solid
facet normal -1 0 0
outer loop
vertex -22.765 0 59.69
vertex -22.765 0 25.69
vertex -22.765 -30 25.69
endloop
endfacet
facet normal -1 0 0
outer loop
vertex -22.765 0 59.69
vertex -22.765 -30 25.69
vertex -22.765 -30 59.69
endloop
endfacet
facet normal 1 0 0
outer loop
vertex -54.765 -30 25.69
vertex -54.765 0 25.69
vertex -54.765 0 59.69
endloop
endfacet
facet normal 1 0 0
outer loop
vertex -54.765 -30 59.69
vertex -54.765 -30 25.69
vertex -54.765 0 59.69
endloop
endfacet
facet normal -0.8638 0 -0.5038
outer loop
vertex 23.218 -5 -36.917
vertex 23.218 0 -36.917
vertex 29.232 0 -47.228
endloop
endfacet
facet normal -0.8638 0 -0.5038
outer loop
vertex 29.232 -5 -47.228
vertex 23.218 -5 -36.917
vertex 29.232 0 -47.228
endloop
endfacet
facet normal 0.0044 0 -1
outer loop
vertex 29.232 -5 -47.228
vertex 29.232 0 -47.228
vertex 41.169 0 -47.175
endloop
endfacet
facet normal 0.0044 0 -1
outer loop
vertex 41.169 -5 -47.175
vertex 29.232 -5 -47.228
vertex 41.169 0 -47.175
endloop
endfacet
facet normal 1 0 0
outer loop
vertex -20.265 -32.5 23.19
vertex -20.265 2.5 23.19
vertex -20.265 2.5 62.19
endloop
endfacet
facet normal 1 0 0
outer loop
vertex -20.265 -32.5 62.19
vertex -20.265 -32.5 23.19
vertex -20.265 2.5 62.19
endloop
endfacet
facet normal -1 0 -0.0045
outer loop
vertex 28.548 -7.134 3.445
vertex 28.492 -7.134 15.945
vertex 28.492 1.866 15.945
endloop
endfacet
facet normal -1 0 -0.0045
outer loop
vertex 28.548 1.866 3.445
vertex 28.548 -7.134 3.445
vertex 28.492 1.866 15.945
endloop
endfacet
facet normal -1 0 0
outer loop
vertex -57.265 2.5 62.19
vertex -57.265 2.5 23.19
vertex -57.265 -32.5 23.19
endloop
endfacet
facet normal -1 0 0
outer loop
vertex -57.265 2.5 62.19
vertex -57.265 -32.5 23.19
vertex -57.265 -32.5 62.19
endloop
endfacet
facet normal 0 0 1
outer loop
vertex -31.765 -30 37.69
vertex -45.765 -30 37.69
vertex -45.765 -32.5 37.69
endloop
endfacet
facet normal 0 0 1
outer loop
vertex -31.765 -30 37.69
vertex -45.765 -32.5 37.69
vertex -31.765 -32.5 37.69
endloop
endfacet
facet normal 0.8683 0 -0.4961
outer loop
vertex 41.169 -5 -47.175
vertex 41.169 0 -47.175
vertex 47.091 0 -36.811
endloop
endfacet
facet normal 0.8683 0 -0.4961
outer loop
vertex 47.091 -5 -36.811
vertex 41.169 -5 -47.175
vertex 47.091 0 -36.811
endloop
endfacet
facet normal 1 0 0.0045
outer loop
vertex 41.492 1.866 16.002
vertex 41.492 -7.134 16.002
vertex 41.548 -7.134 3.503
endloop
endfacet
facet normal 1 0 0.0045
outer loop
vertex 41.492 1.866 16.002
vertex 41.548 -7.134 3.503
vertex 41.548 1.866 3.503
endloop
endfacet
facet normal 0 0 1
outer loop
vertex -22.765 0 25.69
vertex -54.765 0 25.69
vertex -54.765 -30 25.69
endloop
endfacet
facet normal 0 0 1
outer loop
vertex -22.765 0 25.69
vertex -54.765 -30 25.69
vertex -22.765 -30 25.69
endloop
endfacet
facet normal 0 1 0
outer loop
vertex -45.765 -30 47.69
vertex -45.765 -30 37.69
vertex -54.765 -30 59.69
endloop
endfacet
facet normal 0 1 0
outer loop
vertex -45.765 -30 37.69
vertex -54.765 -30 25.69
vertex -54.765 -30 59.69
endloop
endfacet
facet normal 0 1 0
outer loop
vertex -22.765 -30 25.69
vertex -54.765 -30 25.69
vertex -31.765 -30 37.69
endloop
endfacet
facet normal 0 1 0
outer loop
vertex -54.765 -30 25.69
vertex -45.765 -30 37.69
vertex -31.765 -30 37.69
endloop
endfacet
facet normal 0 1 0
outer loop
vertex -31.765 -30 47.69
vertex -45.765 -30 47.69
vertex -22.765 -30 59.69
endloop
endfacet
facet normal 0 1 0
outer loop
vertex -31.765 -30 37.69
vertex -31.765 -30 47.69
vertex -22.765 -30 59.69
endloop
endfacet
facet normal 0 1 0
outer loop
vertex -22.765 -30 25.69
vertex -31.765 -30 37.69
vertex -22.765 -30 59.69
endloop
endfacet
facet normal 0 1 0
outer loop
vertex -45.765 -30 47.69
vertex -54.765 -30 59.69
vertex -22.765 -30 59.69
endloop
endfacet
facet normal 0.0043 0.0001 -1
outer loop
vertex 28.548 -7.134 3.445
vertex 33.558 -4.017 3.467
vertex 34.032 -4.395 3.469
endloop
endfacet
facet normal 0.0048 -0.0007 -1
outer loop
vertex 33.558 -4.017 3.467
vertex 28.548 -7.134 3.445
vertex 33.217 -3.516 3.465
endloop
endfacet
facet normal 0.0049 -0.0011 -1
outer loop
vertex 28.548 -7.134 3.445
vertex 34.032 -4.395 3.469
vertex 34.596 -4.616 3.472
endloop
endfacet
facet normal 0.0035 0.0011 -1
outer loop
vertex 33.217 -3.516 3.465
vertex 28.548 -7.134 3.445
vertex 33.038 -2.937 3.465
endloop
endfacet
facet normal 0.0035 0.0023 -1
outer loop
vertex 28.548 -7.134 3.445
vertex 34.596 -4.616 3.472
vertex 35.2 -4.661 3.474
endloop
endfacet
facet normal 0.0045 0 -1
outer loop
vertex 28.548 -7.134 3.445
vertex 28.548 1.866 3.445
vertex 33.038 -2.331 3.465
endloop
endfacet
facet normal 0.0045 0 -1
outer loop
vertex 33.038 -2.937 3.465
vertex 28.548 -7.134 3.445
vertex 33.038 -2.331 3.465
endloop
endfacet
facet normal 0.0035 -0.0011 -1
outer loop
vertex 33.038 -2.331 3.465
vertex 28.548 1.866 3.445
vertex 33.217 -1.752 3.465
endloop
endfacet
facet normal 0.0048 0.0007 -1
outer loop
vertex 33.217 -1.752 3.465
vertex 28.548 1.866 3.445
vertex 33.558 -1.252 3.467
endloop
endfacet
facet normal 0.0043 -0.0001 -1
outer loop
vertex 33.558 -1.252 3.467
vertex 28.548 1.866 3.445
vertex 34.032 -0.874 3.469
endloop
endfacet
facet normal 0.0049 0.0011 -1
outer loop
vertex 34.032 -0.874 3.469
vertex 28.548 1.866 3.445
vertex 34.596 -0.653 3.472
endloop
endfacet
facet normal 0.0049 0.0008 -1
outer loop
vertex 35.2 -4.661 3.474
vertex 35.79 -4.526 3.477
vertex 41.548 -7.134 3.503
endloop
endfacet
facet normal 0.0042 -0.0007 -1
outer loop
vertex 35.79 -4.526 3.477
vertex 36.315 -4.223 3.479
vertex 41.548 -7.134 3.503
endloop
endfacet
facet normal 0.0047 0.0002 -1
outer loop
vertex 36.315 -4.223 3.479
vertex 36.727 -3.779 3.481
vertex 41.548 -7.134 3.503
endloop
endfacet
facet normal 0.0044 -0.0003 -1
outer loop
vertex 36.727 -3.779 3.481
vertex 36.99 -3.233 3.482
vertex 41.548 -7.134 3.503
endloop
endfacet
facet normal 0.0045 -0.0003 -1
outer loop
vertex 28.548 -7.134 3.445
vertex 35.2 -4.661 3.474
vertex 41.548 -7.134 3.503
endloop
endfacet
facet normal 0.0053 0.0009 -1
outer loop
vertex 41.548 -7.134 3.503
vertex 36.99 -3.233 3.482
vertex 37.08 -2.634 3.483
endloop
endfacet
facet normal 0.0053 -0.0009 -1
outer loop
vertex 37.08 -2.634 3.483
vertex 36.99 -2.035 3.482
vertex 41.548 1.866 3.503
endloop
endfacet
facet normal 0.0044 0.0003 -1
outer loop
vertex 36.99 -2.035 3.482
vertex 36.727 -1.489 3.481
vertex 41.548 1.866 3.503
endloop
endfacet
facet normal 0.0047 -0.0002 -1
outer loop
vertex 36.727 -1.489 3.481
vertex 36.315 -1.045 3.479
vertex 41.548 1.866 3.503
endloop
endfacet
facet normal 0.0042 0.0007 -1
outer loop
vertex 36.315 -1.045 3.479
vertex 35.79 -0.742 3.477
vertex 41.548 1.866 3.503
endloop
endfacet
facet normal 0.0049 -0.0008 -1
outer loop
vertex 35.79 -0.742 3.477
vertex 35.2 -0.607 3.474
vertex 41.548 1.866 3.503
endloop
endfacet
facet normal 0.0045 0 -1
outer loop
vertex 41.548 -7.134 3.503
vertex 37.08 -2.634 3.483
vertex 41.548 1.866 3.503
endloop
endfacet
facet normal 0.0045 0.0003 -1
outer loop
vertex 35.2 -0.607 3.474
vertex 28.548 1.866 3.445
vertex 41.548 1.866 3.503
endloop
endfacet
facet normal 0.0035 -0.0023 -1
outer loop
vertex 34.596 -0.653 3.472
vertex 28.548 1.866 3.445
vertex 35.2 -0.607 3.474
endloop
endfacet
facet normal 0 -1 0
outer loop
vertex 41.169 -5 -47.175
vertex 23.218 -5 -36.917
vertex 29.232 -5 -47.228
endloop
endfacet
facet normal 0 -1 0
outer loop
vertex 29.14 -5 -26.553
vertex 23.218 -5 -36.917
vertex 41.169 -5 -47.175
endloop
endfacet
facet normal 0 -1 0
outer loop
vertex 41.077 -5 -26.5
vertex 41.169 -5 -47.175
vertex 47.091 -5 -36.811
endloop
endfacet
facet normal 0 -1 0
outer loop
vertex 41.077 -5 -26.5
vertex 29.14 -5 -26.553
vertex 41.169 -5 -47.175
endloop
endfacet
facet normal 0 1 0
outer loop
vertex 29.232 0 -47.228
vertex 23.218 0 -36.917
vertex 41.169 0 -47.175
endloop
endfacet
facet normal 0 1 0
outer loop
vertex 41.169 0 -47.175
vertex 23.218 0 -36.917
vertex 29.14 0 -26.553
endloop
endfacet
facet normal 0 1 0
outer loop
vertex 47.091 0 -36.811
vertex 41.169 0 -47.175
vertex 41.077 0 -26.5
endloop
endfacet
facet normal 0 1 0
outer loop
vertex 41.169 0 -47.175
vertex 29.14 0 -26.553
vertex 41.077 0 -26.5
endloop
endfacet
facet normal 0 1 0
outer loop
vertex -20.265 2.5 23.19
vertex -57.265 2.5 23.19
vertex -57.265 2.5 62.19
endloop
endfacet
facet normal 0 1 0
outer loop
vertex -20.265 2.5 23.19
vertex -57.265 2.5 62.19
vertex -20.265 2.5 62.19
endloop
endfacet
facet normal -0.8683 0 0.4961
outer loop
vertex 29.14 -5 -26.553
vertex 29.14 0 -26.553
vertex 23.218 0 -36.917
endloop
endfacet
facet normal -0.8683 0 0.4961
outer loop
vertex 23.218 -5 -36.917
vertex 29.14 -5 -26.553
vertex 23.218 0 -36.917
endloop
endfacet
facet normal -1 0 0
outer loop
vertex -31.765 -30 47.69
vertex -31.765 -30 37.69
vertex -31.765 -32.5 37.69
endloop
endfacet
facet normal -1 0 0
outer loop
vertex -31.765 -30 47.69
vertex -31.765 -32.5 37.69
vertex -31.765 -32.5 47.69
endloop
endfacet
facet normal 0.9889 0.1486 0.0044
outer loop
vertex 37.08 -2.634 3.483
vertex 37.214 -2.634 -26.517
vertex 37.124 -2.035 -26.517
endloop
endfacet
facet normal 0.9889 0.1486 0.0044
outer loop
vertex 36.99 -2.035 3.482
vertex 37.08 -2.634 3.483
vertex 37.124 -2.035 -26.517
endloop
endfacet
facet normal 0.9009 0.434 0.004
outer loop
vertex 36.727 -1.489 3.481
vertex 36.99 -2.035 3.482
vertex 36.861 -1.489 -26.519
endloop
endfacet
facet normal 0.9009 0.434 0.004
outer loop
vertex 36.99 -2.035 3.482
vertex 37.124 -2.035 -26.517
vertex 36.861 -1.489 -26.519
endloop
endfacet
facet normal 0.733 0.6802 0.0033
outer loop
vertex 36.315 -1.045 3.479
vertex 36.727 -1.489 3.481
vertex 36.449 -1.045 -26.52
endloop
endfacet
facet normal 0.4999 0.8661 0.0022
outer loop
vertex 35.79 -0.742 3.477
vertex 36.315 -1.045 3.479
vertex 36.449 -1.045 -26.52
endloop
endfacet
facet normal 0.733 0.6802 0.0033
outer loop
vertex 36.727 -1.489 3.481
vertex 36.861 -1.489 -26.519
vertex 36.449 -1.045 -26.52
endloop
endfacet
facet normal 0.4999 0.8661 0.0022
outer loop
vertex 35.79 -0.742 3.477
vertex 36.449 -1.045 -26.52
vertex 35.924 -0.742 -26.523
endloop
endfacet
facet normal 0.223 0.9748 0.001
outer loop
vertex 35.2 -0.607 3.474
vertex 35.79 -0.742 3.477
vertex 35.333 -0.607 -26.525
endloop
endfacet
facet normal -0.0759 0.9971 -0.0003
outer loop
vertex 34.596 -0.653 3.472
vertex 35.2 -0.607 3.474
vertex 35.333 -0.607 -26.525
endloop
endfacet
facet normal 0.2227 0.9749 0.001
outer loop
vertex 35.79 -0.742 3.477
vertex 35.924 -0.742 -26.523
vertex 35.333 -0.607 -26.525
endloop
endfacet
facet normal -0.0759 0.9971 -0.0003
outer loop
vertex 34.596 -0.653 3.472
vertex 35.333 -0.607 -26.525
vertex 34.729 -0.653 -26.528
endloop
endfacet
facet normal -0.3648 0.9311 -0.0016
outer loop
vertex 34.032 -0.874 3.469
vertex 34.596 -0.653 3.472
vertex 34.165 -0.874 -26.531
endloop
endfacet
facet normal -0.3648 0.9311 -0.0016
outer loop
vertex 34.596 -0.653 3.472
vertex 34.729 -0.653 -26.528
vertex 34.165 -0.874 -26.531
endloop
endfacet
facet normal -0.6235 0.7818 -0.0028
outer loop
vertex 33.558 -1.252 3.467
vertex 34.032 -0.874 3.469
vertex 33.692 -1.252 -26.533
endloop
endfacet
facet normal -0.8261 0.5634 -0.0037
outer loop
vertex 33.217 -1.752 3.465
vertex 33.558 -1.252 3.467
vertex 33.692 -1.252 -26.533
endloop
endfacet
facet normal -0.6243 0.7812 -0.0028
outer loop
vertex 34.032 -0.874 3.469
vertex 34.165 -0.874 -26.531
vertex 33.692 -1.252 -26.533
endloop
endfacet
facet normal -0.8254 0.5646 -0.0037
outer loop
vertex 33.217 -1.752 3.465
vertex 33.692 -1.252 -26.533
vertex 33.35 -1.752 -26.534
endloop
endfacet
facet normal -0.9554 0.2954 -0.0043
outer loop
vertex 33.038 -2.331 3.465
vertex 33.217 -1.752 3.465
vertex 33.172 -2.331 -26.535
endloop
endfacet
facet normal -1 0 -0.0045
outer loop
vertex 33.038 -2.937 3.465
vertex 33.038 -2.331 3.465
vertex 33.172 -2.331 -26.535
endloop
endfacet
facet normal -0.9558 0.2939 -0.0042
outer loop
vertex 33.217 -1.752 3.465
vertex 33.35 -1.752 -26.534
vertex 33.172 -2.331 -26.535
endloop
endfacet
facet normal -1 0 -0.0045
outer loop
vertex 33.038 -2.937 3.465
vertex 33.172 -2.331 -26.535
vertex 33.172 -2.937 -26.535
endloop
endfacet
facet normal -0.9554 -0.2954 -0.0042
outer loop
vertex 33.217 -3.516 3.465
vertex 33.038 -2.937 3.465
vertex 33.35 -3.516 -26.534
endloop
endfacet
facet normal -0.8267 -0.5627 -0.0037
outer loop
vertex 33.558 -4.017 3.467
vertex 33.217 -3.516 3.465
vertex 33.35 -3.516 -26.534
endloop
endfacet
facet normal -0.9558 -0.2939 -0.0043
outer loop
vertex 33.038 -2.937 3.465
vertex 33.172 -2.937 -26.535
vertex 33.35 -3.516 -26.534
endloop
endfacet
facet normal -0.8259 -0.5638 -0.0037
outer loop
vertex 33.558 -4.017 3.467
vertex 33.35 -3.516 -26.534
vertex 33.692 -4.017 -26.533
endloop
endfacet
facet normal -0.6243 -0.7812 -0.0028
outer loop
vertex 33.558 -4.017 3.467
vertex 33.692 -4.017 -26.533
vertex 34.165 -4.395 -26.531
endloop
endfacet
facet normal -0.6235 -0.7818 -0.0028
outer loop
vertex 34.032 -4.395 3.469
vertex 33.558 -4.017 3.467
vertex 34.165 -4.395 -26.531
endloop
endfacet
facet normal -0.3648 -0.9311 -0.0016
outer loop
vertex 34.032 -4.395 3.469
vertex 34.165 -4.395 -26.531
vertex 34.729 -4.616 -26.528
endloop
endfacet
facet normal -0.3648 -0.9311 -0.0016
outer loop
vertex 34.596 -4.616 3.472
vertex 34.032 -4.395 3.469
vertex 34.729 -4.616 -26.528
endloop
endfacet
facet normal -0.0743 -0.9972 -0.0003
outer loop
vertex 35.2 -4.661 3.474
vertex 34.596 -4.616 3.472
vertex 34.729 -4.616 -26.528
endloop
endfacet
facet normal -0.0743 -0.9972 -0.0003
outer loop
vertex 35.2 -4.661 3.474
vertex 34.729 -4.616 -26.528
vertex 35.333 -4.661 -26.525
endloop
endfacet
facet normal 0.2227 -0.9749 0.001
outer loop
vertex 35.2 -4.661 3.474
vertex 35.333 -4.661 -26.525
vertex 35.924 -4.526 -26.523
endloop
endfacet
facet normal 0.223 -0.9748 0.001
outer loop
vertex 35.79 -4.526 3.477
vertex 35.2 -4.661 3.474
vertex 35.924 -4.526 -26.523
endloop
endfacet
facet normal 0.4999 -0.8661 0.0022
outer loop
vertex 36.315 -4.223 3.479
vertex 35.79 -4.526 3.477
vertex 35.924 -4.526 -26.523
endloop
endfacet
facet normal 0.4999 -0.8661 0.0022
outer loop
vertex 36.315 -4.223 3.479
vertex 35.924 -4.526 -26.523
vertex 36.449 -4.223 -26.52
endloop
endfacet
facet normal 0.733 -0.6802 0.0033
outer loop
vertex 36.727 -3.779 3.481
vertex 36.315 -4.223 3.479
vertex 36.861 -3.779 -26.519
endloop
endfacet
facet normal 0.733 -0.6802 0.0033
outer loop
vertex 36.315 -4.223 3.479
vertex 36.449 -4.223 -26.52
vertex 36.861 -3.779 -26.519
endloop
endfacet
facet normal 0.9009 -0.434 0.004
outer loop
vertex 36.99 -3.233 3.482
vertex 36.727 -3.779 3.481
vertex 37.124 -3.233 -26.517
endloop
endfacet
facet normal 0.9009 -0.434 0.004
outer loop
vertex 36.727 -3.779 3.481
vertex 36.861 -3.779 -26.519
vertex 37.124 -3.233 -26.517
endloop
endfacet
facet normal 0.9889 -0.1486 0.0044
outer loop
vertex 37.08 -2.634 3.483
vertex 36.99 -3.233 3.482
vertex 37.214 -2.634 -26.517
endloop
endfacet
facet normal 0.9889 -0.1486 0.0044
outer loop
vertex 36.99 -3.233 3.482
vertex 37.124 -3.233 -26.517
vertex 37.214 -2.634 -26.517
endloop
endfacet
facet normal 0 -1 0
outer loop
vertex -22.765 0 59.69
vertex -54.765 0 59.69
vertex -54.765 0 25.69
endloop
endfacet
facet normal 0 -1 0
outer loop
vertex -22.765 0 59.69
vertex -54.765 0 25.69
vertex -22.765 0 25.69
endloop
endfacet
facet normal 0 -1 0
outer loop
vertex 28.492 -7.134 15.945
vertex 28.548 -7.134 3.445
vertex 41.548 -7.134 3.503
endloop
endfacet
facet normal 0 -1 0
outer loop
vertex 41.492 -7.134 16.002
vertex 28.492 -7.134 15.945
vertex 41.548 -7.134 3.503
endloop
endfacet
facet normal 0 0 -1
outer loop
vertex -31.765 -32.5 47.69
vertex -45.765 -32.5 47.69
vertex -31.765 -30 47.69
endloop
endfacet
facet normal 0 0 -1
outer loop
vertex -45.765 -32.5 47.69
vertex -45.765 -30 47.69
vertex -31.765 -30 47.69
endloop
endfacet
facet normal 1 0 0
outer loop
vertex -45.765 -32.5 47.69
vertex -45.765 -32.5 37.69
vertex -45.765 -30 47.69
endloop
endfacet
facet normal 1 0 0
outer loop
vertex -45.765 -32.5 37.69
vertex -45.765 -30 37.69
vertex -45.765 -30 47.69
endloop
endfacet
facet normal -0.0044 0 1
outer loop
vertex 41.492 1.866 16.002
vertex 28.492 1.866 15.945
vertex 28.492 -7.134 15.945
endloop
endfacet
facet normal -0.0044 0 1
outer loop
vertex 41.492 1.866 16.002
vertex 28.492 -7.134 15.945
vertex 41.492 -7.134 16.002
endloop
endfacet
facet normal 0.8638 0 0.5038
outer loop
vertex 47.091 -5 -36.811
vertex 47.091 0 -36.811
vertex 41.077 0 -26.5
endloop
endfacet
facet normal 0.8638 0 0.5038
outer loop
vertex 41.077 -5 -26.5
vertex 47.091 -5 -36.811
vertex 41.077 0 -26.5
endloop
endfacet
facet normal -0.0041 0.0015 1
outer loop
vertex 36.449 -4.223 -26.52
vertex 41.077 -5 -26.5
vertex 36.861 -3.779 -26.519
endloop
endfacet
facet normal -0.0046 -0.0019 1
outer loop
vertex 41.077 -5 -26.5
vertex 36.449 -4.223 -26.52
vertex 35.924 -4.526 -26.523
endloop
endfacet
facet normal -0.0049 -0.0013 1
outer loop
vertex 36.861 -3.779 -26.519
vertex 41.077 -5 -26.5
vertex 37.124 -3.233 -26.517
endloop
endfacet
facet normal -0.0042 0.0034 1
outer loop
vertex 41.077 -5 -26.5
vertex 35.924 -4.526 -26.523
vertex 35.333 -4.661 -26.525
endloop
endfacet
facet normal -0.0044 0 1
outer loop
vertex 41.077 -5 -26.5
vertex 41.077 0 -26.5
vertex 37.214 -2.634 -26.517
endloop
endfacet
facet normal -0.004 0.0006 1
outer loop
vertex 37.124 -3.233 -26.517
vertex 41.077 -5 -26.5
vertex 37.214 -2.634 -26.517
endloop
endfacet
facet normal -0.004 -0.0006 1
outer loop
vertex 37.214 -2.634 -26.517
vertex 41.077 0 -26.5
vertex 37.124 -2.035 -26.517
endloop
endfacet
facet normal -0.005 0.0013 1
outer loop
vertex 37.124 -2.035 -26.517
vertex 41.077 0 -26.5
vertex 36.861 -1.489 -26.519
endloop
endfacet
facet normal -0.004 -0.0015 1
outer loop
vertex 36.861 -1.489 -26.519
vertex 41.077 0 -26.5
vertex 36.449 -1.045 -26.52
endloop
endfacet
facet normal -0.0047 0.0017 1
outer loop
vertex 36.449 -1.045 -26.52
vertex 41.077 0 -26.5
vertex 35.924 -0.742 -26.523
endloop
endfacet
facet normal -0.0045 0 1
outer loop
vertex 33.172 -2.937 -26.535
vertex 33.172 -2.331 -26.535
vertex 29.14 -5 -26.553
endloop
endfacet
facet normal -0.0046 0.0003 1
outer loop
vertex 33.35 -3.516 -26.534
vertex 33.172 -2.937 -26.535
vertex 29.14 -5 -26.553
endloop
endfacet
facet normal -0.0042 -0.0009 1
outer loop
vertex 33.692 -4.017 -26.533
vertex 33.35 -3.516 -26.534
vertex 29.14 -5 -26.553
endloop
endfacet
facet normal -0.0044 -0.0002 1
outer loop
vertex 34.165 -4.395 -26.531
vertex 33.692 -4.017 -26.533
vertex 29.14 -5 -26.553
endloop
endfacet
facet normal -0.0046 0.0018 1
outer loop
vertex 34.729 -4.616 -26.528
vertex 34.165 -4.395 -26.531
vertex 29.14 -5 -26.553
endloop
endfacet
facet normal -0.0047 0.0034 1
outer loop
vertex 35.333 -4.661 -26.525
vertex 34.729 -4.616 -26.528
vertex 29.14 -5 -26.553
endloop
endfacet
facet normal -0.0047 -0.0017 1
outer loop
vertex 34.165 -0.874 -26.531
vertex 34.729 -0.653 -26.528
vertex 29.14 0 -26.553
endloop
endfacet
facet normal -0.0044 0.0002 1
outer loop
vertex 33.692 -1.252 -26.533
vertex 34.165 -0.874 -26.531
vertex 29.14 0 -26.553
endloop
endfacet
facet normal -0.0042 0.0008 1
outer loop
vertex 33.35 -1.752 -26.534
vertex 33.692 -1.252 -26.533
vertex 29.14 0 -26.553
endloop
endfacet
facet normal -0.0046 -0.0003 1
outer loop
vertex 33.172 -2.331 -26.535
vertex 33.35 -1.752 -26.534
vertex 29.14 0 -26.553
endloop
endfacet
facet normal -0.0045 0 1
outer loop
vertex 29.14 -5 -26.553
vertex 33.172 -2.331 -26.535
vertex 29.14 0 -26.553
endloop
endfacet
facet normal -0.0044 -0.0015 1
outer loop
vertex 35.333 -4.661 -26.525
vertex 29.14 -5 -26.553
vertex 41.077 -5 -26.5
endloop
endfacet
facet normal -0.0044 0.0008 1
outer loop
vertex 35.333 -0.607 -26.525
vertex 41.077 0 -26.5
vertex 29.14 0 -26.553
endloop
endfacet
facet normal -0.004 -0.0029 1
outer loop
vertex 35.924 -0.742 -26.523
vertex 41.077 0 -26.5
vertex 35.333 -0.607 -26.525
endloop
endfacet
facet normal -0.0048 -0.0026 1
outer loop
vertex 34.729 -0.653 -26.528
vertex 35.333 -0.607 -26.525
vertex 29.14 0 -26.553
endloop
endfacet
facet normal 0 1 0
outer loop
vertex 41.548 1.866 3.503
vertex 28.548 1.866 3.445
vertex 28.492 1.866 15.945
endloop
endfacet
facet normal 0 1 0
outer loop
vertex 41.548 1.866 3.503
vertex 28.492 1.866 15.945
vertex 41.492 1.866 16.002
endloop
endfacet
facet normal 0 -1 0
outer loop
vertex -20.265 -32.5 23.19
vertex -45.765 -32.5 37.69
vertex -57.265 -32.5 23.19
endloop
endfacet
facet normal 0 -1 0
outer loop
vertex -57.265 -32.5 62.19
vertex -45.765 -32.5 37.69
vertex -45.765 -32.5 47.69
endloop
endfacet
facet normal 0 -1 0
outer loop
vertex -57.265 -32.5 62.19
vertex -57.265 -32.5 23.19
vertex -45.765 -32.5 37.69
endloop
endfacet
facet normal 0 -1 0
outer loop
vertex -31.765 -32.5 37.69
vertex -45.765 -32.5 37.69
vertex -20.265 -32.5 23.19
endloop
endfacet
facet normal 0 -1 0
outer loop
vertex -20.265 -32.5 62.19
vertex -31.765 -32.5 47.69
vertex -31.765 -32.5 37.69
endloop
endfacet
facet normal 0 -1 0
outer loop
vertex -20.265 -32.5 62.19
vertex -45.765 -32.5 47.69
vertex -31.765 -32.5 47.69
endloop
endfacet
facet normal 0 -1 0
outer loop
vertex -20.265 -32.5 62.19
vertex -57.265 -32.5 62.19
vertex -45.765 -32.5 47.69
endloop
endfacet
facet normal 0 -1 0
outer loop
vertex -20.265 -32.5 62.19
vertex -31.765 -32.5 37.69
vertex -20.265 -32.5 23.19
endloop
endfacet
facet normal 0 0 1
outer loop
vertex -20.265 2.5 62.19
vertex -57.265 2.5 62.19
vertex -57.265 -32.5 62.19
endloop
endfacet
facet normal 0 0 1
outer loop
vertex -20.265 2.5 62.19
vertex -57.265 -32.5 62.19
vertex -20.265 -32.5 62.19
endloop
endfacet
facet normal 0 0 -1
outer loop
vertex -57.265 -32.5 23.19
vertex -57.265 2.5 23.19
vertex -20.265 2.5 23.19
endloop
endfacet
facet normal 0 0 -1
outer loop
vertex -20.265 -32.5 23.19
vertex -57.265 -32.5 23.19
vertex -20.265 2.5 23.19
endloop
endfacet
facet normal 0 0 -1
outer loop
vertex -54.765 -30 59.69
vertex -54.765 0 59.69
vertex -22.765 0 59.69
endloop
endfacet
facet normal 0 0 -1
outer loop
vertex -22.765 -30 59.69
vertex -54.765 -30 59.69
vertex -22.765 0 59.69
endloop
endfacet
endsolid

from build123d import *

# Parameters (mm, degrees)
F0_W     = 14
F0_H     = 10
F1_DEPTH = 20
F0_W_2   = 32
F0_H_2   = 34
F2_DEPTH = 30
F3_T     = 2.5
F5_DEPTH = 5
F6_R     = 2.0325085079
F7_DEPTH = 30
F8_W     = 13
F8_H     = 9
F9_DEPTH = 12.5


with BuildPart() as f1:
    # F0 (on Front) → F1 (new body)
    with BuildSketch(Plane.XZ):
        with Locations((-38.7646174058, 42.6897948307)):
            Rectangle(F0_W, F0_H)
    extrude(amount=F1_DEPTH)

    # F0 (on Front) → F2 (join)
    with BuildSketch(Plane.XZ):
        with Locations((-38.7646174058, 42.6897948307)):
            Rectangle(F0_W_2, F0_H_2)
        with Locations((-38.7646174058, 42.6897948307)):
            Rectangle(F0_W, F0_H, mode=Mode.SUBTRACT)
    extrude(amount=F2_DEPTH)

    # F3
    f3_openings = [f1.faces().sort_by_distance(p)[0] for p in [
        (-38.764617, -25, 47.689795),
        (-31.764617, -25, 42.689795),
        (-38.764617, -25, 37.689795),
        (-45.764617, -25, 42.689795),
        (-38.764617, -20, 42.689795),
    ]]
    offset(amount=F3_T, openings=f3_openings, kind=Kind.INTERSECTION)


with BuildPart() as f5:
    # F4 (on Front) → F5 (new body)
    with BuildSketch(Plane.XZ):
        Polygon((41.1687466269, -47.1749319755), (47.0910918946, -36.8108288324), (41.0766879191, -26.4998758091), (29.1399386759, -26.5530259288), (23.2175934081, -36.9171290719), (29.2319973836, -47.2280820953), align=None)
    extrude(amount=F5_DEPTH)

    # F6 (on face) → F7 (join)
    with BuildSketch(Plane(origin=(0.1188066014, 0, -26.6822467588), x_dir=(0.9999900871, 0, 0.0044526019), z_dir=(-0.0044526019, 0, 0.9999900871))):
        with Locations((35.0630283356, -2.6342964265)):
            Circle(F6_R)
    extrude(amount=F7_DEPTH)

    # F8 (on face) → F9 (join)
    with BuildSketch(Plane(origin=(-0.0147714568, 0, 3.3174558548), x_dir=(0.9999900871, 0, 0.0044526019), z_dir=(-0.0044526019, 0, 0.9999900871))):
        with Locations((35.0630283356, -2.6342964265)):
            Rectangle(F8_W, F8_H)
    extrude(amount=F9_DEPTH)


solid = Compound([f1.part, f5.part])
